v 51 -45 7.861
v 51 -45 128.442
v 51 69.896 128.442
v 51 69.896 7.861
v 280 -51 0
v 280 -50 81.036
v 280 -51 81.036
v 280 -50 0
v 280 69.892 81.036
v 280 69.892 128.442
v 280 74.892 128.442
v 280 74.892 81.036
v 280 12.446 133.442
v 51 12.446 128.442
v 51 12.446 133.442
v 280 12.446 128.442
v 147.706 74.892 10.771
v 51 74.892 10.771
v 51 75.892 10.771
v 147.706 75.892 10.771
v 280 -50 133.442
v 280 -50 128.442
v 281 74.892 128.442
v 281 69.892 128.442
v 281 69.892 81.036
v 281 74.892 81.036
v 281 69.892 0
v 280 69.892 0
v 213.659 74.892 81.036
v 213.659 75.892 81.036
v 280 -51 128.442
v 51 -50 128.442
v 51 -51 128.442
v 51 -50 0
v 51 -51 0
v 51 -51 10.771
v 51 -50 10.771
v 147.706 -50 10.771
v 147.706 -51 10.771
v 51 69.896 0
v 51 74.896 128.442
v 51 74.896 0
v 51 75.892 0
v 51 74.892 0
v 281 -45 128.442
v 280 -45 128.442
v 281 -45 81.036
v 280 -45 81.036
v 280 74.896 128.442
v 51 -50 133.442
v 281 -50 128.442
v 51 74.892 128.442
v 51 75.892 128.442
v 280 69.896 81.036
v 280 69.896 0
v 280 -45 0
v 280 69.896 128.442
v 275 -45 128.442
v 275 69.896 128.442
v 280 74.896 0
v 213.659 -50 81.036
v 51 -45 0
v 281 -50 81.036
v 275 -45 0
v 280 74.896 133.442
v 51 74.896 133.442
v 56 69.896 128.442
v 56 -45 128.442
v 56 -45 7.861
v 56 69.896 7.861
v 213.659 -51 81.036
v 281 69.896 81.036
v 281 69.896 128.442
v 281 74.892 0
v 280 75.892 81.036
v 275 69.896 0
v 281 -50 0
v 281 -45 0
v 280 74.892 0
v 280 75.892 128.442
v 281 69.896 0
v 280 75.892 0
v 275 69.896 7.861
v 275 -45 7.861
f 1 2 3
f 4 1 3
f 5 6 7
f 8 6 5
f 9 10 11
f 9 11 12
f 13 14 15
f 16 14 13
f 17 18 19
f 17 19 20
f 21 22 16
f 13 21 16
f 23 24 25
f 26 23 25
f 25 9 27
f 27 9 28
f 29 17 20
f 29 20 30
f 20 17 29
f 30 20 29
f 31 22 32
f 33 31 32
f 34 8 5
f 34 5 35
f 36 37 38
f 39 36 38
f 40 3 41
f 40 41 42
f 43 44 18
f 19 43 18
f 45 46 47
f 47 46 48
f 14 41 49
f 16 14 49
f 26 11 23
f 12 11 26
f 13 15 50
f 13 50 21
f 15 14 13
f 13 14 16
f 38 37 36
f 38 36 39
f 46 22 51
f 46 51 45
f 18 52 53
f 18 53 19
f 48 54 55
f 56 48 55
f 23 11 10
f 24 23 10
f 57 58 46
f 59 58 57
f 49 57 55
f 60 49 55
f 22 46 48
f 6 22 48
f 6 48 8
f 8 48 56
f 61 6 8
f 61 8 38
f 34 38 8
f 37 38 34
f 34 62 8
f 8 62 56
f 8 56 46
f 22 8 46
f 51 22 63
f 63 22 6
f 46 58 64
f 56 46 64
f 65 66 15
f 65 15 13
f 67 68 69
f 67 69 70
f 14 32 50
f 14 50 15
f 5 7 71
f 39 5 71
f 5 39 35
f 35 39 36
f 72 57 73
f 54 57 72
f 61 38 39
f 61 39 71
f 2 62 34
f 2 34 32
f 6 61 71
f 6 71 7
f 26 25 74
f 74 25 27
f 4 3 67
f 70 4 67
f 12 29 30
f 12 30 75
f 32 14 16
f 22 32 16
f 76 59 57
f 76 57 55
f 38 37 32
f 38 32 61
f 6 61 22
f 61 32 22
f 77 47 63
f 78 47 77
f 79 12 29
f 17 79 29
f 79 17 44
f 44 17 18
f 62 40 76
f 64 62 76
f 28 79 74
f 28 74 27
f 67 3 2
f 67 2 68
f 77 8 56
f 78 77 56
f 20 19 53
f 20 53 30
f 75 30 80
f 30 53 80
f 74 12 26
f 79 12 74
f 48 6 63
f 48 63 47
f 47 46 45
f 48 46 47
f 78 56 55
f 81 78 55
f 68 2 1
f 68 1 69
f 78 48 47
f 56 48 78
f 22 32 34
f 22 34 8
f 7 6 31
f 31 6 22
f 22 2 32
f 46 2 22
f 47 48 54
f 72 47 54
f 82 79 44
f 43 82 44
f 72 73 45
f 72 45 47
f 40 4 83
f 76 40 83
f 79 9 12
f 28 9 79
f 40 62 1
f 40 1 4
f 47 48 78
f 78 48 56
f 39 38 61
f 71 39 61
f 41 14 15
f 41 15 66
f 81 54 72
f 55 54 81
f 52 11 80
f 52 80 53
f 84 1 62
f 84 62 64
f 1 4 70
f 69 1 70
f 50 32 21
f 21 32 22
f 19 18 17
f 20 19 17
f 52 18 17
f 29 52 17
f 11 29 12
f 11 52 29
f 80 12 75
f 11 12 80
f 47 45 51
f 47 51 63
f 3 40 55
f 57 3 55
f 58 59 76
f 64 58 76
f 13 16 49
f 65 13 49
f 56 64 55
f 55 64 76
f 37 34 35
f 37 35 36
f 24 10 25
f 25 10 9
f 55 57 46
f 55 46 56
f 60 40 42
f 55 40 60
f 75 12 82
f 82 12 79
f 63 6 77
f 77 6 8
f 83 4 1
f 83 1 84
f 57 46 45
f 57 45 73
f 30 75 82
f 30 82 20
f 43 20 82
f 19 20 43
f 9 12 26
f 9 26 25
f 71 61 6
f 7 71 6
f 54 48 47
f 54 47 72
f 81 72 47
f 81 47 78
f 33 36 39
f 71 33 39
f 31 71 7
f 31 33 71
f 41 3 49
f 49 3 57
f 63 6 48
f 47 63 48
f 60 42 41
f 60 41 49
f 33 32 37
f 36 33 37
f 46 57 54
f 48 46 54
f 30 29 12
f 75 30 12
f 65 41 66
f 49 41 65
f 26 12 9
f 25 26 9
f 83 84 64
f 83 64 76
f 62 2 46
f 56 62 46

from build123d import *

# Parameters (mm, degrees)
SKETCH_1_W          = 229
SKETCH_1_H          = 124.895981316
EXTRUDE_1_DEPTH     = 7.860636733
SKETCH_2_W          = 229
SKETCH_2_H          = 5
CUT_EXTRUDE_1_DEPTH = 7.860636733
SKETCH_4_W          = 229
SKETCH_4_H          = 5
CUT_EXTRUDE_2_DEPTH = 7.860636733
SKETCH_5_W          = 5
SKETCH_5_H          = 114.895981316
CUT_EXTRUDE_3_DEPTH = 7.860636733
SKETCH_6_W          = 229
SKETCH_6_H          = 128.442125646
EXTRUDE_3_DEPTH     = 5
SKETCH_7_W          = 5
SKETCH_7_H          = 114.895981316
EXTRUDE_4_DEPTH     = 120.581488912
SKETCH_8_W          = 229
SKETCH_8_H          = 128.442125646
EXTRUDE_5_DEPTH     = 5
SKETCH_9_W          = 229
SKETCH_9_H          = 62.45
EXTRUDE_6_DEPTH     = 5
SKETCH_10_W         = 229
SKETCH_10_H         = 62.445981316
EXTRUDE_7_DEPTH     = 5
SKETCH_11_W         = 128.442125646
SKETCH_11_H         = 114.895981316
EXTRUDE_8_DEPTH     = 5
EXTRUDE_9_DEPTH     = 1
EXTRUDE_10_DEPTH    = 1
SKETCH_14_W         = 47.406489423
SKETCH_14_H         = 5
EXTRUDE_11_DEPTH    = 1
SKETCH_15_W         = 81.035636223
SKETCH_15_H         = 5
EXTRUDE_12_DEPTH    = 1
SKETCH_16_W         = 47.406489423
SKETCH_16_H         = 114.895981316
EXTRUDE_13_DEPTH    = 1
SKETCH_17_W         = 81.035636223
SKETCH_17_H         = 114.895981316
EXTRUDE_14_DEPTH    = 1


with BuildPart() as part:
    # 스케치1 → 보스-돌출1 (new body)
    with BuildSketch(Plane.XY):
        with Locations((165.5, 12.447990658)):
            Rectangle(SKETCH_1_W, SKETCH_1_H)
    extrude(amount=EXTRUDE_1_DEPTH)

    # 스케치2 → 컷-돌출1 (cut)
    with BuildSketch(Plane.XY.offset(7.860636733)):
        with Locations((165.5, 72.395981316)):
            Rectangle(SKETCH_2_W, SKETCH_2_H)
    extrude(amount=-CUT_EXTRUDE_1_DEPTH, mode=Mode.SUBTRACT)

    # 스케치4 → 컷-돌출2 (cut)
    with BuildSketch(Plane.XY.offset(7.860636733)):
        with Locations((165.5, -47.5)):
            Rectangle(SKETCH_4_W, SKETCH_4_H)
    extrude(amount=-CUT_EXTRUDE_2_DEPTH, mode=Mode.SUBTRACT)

    # 스케치5 → 컷-돌출3 (cut)
    with BuildSketch(Plane.XY.offset(7.860636733)):
        with Locations((277.5, 12.447990658)):
            Rectangle(SKETCH_5_W, SKETCH_5_H)
    extrude(amount=-CUT_EXTRUDE_3_DEPTH, mode=Mode.SUBTRACT)


with BuildPart() as body_2:
    # 스케치6 → 보스-돌출3 (new body)
    with BuildSketch(Plane(origin=(0, 69.895981316, 0), x_dir=(1, 0, 0), z_dir=(0, 1, 0))):
        with Locations((165.5, -64.221062823)):
            Rectangle(SKETCH_6_W, SKETCH_6_H)
    extrude(amount=EXTRUDE_3_DEPTH)


with BuildPart() as body_3:
    # 스케치7 → 보스-돌출4 (new body)
    with BuildSketch(Plane.XY.offset(7.860636733)):
        with Locations((53.5, 12.447990658)):
            Rectangle(SKETCH_7_W, SKETCH_7_H)
    extrude(amount=EXTRUDE_4_DEPTH)


with BuildPart() as body_4:
    # 스케치8 → 보스-돌출5 (new body)
    with BuildSketch(Plane.XZ.offset(45)):
        with Locations((165.5, 64.221062823)):
            Rectangle(SKETCH_8_W, SKETCH_8_H)
    extrude(amount=EXTRUDE_5_DEPTH)


with BuildPart() as body_5:
    # 스케치9 → 보스-돌출6 (new body)
    with BuildSketch(Plane.XY.offset(128.442125646)):
        with Locations((165.5, 43.670981316)):
            Rectangle(SKETCH_9_W, SKETCH_9_H)
    extrude(amount=EXTRUDE_6_DEPTH)


with BuildPart() as body_6:
    # 스케치10 → 보스-돌출7 (new body)
    with BuildSketch(Plane.XY.offset(128.442125646)):
        with Locations((165.5, -18.777009342)):
            Rectangle(SKETCH_10_W, SKETCH_10_H)
    extrude(amount=EXTRUDE_7_DEPTH)


with BuildPart() as body_7:
    # 스케치11 → 보스-돌출8 (new body)
    with BuildSketch(Plane(origin=(275, 0, 0), x_dir=(0, 0, -1), z_dir=(1, 0, 0))):
        with Locations((-64.221062823, 12.447990658)):
            Rectangle(SKETCH_11_W, SKETCH_11_H)
    extrude(amount=EXTRUDE_8_DEPTH)


with BuildPart() as body_8:
    # 스케치12 → 보스-돌출9 (new body)
    with BuildSketch(Plane.XZ.offset(50)):
        Polygon((51, 10.771238208), (147.705868367, 10.771238208), (213.658520424, 81.035636223), (280, 81.035636223), (280, 0), (51, 0), align=None)
    extrude(amount=EXTRUDE_9_DEPTH)


with BuildPart() as body_9:
    # 스케치13 → 보스-돌출10 (new body)
    with BuildSketch(Plane.XZ.offset(50)):
        Polygon((51, 128.442125646), (51, 10.771238208), (147.705868367, 10.771238208), (213.658520424, 81.035636223), (280, 81.035636223), (280, 128.442125646), align=None)
    extrude(amount=EXTRUDE_10_DEPTH)


with BuildPart() as body_10:
    # 스케치14 → 보스-돌출11 (new body)
    with BuildSketch(Plane(origin=(280, 0, 0), x_dir=(0, 0, -1), z_dir=(1, 0, 0))):
        with Locations((-104.738880935, -47.5)):
            Rectangle(SKETCH_14_W, SKETCH_14_H)
    extrude(amount=EXTRUDE_11_DEPTH)


with BuildPart() as body_11:
    # 스케치15 → 보스-돌출12 (new body)
    with BuildSketch(Plane(origin=(280, 0, 0), x_dir=(0, 0, -1), z_dir=(1, 0, 0))):
        with Locations((-40.517818112, -47.5)):
            Rectangle(SKETCH_15_W, SKETCH_15_H)
    extrude(amount=EXTRUDE_12_DEPTH)


with BuildPart() as body_12:
    # 스케치16 → 보스-돌출13 (new body)
    with BuildSketch(Plane(origin=(280, 0, 0), x_dir=(0, 0, -1), z_dir=(1, 0, 0))):
        with Locations((-104.738880935, 12.447990658)):
            Rectangle(SKETCH_16_W, SKETCH_16_H)
    extrude(amount=EXTRUDE_13_DEPTH)


with BuildPart() as body_13:
    # 스케치17 → 보스-돌출14 (new body)
    with BuildSketch(Plane(origin=(280, 0, 0), x_dir=(0, 0, -1), z_dir=(1, 0, 0))):
        with Locations((-40.517818112, 12.447990658)):
            Rectangle(SKETCH_17_W, SKETCH_17_H)
    extrude(amount=EXTRUDE_14_DEPTH)


with BuildPart() as body_14:
    # 대칭 복사2: mirrored copy
    add(body_8.part.mirror(Plane.ZX.offset(12.445981316)))


with BuildPart() as body_15:
    # Mirror 2 2: mirrored copy
    add(body_9.part.mirror(Plane.ZX.offset(12.445981316)))


with BuildPart() as body_16:
    # Mirror 2 3: mirrored copy
    add(body_10.part.mirror(Plane.ZX.offset(12.445981316)))


with BuildPart() as body_17:
    # Mirror 2 4: mirrored copy
    add(body_11.part.mirror(Plane.ZX.offset(12.445981316)))


solid = Compound([part.part, body_2.part, body_3.part, body_4.part, body_5.part, body_6.part, body_7.part, body_8.part, body_9.part, body_10.part, body_11.part, body_12.part, body_13.part, body_14.part, body_15.part, body_16.part, body_17.part])
